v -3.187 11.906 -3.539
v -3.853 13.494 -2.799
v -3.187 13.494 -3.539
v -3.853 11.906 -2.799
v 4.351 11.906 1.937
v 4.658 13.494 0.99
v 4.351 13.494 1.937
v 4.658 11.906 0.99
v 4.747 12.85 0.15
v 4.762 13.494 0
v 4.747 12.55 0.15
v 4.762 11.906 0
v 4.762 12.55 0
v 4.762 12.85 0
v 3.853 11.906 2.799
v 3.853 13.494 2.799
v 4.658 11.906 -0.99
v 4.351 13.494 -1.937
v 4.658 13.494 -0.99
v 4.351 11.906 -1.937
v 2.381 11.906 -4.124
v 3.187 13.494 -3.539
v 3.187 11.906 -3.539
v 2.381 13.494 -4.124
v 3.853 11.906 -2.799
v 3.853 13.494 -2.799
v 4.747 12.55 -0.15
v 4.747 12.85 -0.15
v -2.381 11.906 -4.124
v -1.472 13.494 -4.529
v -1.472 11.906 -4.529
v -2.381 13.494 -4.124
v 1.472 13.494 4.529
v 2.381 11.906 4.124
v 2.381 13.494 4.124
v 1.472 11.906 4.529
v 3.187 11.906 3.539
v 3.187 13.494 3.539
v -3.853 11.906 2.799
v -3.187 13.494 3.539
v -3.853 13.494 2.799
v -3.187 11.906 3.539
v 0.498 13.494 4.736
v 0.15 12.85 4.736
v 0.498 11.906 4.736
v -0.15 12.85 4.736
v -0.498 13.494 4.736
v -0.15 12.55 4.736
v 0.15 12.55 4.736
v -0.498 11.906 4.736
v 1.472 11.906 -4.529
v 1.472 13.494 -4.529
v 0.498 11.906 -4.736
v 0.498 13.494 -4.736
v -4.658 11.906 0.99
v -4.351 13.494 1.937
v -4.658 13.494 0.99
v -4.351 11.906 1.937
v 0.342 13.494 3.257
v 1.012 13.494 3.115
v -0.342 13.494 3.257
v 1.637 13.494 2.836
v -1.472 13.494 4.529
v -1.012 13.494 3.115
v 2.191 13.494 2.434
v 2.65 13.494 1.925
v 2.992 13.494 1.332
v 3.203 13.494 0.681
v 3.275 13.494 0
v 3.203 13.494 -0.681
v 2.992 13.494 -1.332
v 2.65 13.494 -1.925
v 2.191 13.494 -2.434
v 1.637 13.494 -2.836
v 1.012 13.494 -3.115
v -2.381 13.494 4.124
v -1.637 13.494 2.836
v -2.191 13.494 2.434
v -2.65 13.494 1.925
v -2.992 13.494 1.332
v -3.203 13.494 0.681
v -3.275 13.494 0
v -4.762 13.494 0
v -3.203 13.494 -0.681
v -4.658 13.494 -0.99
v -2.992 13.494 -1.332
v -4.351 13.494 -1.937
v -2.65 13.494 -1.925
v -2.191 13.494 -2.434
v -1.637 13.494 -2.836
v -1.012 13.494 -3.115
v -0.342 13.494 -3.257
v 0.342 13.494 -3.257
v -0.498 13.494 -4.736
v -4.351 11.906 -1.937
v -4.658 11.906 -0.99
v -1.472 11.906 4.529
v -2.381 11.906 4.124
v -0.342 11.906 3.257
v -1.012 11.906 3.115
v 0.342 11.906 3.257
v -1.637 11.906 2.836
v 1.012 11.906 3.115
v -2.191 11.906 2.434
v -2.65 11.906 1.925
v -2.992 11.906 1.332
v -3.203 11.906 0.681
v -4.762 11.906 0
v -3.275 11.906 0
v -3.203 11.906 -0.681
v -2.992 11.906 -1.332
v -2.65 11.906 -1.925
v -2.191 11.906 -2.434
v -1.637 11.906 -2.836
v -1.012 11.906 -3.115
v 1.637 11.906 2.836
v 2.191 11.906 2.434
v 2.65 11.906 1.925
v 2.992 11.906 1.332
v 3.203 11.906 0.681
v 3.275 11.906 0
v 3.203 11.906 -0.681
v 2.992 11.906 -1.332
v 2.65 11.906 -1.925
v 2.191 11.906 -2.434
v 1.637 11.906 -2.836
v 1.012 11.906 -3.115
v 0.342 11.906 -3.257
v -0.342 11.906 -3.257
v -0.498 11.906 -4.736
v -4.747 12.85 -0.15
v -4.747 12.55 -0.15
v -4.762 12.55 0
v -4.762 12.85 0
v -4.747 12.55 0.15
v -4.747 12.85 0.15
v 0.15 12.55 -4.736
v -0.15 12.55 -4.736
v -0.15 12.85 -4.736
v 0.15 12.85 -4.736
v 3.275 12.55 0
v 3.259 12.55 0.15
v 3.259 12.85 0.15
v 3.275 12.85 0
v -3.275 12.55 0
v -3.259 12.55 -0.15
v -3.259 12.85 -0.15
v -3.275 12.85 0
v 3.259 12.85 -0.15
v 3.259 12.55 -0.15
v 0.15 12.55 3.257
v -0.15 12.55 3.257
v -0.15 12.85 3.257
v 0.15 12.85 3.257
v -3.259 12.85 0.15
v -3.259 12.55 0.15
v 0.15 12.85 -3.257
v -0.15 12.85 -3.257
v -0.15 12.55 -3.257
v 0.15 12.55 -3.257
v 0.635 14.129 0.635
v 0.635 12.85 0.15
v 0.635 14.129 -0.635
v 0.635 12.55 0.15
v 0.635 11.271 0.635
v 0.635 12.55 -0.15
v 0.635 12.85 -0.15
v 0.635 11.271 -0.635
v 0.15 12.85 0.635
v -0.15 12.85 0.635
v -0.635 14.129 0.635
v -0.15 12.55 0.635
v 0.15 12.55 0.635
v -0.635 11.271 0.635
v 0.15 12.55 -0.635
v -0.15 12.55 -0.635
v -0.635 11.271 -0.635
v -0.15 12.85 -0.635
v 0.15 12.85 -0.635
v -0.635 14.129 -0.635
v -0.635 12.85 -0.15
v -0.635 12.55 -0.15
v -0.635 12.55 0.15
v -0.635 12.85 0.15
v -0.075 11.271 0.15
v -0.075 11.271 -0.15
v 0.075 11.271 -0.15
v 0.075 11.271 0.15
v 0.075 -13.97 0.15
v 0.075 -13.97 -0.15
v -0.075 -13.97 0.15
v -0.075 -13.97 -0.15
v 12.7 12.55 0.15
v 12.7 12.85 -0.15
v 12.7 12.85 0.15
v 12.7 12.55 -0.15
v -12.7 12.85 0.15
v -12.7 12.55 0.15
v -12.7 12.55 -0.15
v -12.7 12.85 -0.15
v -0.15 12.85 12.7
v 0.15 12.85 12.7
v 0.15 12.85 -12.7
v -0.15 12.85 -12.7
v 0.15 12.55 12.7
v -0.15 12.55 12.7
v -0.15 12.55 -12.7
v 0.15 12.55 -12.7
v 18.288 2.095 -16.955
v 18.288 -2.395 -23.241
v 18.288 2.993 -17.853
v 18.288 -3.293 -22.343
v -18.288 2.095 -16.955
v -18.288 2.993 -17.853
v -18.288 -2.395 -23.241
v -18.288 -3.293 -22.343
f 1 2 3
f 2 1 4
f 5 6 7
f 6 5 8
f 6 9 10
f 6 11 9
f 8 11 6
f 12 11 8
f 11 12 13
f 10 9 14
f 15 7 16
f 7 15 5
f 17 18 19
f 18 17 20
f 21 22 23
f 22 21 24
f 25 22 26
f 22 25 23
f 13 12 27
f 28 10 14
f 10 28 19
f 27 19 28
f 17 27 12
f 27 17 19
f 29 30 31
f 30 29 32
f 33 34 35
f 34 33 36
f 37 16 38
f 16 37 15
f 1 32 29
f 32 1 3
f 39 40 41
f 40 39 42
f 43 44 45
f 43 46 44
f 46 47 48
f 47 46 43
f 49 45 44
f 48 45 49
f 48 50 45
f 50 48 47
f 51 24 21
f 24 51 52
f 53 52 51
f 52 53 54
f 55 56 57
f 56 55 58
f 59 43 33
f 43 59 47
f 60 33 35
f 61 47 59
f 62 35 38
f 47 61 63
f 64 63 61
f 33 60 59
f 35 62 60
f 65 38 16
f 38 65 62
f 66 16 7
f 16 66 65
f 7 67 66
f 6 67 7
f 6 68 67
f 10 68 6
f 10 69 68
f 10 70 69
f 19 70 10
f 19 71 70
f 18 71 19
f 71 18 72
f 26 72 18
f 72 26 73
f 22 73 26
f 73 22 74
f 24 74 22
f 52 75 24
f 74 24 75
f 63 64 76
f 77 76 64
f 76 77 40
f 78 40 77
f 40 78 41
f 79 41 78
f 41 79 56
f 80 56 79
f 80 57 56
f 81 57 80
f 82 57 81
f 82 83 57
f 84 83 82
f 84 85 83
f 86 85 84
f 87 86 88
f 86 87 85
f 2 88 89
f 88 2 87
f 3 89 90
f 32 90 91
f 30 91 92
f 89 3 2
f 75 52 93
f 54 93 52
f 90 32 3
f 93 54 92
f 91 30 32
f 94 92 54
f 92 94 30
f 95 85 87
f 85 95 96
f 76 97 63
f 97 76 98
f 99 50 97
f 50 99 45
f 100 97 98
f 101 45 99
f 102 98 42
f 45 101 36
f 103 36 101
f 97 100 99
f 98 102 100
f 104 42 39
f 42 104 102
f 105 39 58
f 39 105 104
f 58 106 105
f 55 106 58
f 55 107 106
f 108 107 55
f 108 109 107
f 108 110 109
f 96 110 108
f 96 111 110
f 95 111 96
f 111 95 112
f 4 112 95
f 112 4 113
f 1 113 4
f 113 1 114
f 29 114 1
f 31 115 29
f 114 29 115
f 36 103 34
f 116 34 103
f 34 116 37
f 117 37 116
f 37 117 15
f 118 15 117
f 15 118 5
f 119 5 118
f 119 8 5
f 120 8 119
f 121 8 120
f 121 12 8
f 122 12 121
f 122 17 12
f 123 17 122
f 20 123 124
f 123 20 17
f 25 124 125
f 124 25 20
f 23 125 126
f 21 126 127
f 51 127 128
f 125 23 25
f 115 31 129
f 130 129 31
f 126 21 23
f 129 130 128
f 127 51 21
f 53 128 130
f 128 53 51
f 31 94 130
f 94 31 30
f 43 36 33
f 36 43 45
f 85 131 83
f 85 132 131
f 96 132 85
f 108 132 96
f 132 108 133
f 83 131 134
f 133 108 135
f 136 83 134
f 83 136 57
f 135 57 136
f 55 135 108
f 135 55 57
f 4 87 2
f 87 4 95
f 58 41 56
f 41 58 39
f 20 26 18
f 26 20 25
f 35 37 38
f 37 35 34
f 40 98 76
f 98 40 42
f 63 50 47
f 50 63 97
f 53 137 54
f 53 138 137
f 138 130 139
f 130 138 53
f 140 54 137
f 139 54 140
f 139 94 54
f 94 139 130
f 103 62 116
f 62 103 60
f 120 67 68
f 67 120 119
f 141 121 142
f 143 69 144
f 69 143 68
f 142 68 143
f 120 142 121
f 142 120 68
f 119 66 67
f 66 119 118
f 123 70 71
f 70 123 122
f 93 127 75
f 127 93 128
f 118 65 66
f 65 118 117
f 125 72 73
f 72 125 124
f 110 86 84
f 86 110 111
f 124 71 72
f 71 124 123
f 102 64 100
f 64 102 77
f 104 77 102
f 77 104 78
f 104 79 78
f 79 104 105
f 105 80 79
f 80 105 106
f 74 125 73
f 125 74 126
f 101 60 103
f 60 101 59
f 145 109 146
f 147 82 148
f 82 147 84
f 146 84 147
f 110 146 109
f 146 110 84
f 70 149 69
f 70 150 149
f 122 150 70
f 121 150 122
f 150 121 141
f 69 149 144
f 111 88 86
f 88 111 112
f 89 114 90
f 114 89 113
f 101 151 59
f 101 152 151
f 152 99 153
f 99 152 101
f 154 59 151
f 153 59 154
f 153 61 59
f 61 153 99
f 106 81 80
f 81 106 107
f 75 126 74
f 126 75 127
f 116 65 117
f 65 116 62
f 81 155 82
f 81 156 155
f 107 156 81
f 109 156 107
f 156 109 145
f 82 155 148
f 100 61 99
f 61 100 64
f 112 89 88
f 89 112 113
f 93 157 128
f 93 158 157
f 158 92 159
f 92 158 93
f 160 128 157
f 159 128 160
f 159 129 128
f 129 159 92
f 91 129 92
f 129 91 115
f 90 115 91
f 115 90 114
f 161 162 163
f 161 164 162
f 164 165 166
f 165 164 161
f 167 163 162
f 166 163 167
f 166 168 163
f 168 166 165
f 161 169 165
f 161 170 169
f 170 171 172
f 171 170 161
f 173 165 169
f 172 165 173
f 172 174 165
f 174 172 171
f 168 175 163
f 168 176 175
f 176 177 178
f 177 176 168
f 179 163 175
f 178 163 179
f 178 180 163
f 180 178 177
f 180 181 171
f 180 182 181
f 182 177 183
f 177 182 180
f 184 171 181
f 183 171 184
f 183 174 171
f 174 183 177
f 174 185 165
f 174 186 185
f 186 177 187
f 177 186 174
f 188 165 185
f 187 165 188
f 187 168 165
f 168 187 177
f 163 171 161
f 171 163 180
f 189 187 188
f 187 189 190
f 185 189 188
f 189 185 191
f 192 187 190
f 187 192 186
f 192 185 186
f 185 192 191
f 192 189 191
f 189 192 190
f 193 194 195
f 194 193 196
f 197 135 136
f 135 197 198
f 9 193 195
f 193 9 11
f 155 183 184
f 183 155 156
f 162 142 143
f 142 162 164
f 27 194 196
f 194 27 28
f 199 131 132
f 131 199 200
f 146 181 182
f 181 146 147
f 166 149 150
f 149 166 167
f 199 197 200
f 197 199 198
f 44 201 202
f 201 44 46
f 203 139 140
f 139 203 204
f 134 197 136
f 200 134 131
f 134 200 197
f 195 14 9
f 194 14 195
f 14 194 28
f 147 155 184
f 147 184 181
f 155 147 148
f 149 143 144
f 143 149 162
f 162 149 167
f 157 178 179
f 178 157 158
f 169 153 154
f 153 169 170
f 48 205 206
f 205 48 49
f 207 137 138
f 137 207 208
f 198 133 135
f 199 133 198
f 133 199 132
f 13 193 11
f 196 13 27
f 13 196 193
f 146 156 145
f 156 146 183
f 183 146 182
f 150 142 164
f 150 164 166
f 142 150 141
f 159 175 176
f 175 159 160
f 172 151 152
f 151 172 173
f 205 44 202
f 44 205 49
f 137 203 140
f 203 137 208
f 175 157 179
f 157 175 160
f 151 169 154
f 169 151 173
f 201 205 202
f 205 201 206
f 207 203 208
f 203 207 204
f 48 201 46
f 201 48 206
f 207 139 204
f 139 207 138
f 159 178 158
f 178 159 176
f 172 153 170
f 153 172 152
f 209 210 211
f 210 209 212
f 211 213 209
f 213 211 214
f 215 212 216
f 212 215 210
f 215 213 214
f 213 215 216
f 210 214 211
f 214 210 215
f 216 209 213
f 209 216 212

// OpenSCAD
include <../mo/mo.scad>

module SpacerBuild( t, d, id, caps ) {
  color( BlackDelrin ) {
    rotate( [90,0,0] )
      difference() {
        cylinder( h = t, r = d/2, center = true  );
        if ( id > 0 ) 
        cylinder( h = t + 2 * Epsilon, r = id/2 + Epsilon, center = true  );
      }
  }
}

function moSpacerPosition( p = 0, t = 1 * in ) = [   
  [
    0,
    ( ( p == 0 ) || ( p == 3 ) ) ? 0 : ( ( p == 1 ) ? -t/2 : t/2 ),
    0        
  ],
  [
    0,
    0,
    1,
  ],
  ( p==2 ) ? 180 : 0
];

module moSpacer( p = 0, t = 0.0625 * in, d = 0.375 * in, id = 0.25 * in, info = false ) {
  moMoveOriginTo( moSpacerPosition( p, t ) ) 
  {
    SpacerBuild( t, d, id );
    if ( info == true ) {
      for ( i = [ 0 : 2 ] ) {
        moMoveTo( moSpacerPosition( i, t ) )
          moPosition( i );
       }
    }
  }
  if ( info == true )
    moPartOrigin();
  if ( $name )
    moPartLabel( parent_module( 1 ) );
}

// Make  Spacer - centered
moMoveOriginTo( moSpacerPosition( 1 ) )
  moSpacer( 0, t = 0.0625*in, d = 0.375*in, id = 0.25 * in, caps = false, info = true, $name = true );
